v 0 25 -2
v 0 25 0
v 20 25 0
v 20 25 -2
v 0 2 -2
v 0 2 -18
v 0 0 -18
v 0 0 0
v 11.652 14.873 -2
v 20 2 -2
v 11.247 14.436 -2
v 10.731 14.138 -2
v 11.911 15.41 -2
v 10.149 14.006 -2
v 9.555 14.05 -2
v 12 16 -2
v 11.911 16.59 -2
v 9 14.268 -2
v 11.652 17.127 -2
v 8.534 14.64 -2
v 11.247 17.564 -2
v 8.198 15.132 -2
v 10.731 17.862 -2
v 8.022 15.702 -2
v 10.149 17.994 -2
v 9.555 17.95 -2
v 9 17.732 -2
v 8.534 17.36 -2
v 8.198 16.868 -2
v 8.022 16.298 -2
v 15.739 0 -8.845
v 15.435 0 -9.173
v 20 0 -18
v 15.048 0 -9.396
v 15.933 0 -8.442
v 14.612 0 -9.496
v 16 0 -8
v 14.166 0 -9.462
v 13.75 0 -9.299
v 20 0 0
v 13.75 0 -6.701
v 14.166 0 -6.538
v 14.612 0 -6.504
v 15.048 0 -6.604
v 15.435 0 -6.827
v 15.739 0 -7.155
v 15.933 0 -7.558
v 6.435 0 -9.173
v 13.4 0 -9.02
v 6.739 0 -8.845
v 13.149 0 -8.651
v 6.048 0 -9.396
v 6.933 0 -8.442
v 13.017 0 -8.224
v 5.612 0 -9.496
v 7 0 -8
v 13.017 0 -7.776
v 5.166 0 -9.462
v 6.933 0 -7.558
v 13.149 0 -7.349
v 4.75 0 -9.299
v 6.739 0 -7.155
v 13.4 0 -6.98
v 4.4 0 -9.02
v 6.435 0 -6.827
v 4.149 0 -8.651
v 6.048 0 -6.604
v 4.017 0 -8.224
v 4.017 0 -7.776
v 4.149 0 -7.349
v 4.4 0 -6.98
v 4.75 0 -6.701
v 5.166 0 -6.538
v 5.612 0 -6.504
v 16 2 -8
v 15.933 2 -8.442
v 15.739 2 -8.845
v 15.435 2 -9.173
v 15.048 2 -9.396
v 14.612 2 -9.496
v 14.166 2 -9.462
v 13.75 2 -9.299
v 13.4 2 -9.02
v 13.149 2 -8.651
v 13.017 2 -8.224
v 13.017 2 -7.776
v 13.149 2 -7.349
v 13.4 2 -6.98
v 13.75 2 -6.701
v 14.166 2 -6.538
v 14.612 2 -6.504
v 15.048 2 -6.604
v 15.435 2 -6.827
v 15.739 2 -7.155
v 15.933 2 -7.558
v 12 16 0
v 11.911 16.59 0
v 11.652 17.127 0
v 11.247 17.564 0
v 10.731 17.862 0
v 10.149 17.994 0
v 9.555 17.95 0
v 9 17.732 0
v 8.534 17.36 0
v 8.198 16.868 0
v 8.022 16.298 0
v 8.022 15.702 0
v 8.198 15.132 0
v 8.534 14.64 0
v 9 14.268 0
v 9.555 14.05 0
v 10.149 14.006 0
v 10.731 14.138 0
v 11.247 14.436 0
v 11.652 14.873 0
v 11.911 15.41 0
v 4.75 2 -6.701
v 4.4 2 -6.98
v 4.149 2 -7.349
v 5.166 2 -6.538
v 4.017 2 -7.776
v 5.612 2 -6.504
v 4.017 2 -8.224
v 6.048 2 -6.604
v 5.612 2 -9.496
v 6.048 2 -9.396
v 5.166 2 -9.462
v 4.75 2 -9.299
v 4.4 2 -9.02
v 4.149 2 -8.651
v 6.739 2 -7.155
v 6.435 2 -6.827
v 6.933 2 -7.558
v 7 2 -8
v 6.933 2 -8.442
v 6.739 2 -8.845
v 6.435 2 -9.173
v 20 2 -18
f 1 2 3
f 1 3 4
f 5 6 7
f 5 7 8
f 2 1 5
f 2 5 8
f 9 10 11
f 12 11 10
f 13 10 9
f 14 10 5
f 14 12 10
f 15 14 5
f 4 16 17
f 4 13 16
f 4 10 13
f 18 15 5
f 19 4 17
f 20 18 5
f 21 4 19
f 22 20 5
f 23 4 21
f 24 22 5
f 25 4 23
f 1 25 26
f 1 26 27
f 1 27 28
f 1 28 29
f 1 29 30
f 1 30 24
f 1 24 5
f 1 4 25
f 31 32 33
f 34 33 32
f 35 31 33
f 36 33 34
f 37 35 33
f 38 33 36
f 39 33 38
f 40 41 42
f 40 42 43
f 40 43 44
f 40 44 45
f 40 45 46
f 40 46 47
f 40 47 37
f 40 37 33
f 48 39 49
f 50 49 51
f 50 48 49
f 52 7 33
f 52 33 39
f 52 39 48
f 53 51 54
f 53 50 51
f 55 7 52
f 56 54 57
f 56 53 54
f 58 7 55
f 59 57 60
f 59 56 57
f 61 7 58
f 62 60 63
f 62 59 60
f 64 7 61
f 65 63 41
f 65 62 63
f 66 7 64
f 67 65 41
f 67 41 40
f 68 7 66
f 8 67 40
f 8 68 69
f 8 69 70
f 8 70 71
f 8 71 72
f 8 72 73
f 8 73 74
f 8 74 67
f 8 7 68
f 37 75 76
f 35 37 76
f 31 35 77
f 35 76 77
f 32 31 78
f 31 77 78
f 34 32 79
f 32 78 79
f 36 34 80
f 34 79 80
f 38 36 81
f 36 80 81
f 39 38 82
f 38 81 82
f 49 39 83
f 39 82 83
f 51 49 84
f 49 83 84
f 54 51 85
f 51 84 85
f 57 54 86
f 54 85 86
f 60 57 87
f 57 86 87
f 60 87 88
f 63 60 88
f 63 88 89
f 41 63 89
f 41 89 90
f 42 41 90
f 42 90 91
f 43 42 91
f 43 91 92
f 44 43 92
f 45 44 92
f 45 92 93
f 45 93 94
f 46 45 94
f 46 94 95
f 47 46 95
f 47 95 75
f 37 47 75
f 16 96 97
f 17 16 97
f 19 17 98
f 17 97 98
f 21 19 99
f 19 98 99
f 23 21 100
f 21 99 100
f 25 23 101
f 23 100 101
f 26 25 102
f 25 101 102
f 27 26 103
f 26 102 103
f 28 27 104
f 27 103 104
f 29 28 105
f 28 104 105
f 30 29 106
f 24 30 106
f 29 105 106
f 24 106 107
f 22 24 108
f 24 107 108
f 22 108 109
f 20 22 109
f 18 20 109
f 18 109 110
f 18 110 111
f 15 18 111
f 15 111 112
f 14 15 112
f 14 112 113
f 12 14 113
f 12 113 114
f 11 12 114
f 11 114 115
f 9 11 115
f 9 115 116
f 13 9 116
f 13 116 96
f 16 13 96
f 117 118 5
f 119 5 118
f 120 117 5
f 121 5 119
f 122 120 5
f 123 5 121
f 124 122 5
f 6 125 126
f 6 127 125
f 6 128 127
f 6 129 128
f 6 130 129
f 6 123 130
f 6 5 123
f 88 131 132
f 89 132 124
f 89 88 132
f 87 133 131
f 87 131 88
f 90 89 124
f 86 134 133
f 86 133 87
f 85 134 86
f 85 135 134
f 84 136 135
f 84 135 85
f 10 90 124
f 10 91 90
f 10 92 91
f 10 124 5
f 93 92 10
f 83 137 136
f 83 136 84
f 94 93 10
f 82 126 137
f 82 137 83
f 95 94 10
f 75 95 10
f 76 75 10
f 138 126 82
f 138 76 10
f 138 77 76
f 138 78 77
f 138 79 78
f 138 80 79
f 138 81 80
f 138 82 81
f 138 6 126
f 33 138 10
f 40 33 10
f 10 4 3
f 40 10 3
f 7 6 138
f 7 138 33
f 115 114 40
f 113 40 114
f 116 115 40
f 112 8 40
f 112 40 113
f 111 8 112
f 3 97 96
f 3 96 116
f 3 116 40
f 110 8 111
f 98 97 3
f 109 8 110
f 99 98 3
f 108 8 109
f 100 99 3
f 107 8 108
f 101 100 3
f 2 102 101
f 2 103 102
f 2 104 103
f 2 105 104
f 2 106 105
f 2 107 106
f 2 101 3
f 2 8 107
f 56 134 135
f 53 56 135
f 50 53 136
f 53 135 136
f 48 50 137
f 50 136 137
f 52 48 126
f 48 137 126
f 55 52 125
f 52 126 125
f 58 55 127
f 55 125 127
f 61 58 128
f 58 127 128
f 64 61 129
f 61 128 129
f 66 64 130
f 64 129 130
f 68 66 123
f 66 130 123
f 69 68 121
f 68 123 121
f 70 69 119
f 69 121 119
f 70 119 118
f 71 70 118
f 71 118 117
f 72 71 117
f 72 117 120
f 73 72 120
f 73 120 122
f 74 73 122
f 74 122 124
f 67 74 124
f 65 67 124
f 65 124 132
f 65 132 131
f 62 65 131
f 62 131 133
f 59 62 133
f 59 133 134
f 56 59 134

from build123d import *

# Parameters (mm, degrees)
EXTRUDE_1_DEPTH     = 20
SKETCH_2_R          = 1.5
CUT_EXTRUDE_1_DEPTH = 4
SKETCH_3_R          = 2
CUT_EXTRUDE_2_DEPTH = 19
SKETCH_4_W          = 20
SKETCH_4_H          = 15
CUT_EXTRUDE_3_DEPTH = 1
SKETCH_5_W          = 20
SKETCH_5_H          = 23
CUT_EXTRUDE_4_DEPTH = 1


with BuildPart() as part:
    # 草图1 → 凸台-拉伸1 (new body)
    with BuildSketch(Plane(origin=(0, 0, 0), x_dir=(0, 0, -1), z_dir=(1, 0, 0))):
        Polygon((0, 0), (0, 25), (3, 25), (3, 3), (18, 3), (18, 0), align=None)
    extrude(amount=EXTRUDE_1_DEPTH)

    # 草图2 → 切除-拉伸1 (cut, through all)
    with BuildSketch(Plane(origin=(0, 3, 0), x_dir=(1, 0, 0), z_dir=(0, 1, 0))):
        with Locations((5.5, 8)):
            Circle(SKETCH_2_R)
        with Locations((14.5, 8)):
            Circle(SKETCH_2_R)
    extrude(amount=-CUT_EXTRUDE_1_DEPTH, mode=Mode.SUBTRACT)

    # 草图3 → 切除-拉伸2 (cut, through all)
    with BuildSketch(Plane.XY):
        with Locations((10, 16)):
            Circle(SKETCH_3_R)
    extrude(amount=-CUT_EXTRUDE_2_DEPTH, mode=Mode.SUBTRACT)

    # 草图4 → 切除-拉伸3 (cut)
    with BuildSketch(Plane(origin=(0, 3, 0), x_dir=(1, 0, 0), z_dir=(0, 1, 0))):
        with Locations((10, 10.5)):
            Rectangle(SKETCH_4_W, SKETCH_4_H)
    extrude(amount=-CUT_EXTRUDE_3_DEPTH, mode=Mode.SUBTRACT)

    # 草图5 → 切除-拉伸4 (cut)
    with BuildSketch(Plane(origin=(0, 0, -3), x_dir=(-1, 0, 0), z_dir=(0, 0, -1))):
        with Locations((-10, 13.5)):
            Rectangle(SKETCH_5_W, SKETCH_5_H)
    extrude(amount=-CUT_EXTRUDE_4_DEPTH, mode=Mode.SUBTRACT)


solid = part.part
